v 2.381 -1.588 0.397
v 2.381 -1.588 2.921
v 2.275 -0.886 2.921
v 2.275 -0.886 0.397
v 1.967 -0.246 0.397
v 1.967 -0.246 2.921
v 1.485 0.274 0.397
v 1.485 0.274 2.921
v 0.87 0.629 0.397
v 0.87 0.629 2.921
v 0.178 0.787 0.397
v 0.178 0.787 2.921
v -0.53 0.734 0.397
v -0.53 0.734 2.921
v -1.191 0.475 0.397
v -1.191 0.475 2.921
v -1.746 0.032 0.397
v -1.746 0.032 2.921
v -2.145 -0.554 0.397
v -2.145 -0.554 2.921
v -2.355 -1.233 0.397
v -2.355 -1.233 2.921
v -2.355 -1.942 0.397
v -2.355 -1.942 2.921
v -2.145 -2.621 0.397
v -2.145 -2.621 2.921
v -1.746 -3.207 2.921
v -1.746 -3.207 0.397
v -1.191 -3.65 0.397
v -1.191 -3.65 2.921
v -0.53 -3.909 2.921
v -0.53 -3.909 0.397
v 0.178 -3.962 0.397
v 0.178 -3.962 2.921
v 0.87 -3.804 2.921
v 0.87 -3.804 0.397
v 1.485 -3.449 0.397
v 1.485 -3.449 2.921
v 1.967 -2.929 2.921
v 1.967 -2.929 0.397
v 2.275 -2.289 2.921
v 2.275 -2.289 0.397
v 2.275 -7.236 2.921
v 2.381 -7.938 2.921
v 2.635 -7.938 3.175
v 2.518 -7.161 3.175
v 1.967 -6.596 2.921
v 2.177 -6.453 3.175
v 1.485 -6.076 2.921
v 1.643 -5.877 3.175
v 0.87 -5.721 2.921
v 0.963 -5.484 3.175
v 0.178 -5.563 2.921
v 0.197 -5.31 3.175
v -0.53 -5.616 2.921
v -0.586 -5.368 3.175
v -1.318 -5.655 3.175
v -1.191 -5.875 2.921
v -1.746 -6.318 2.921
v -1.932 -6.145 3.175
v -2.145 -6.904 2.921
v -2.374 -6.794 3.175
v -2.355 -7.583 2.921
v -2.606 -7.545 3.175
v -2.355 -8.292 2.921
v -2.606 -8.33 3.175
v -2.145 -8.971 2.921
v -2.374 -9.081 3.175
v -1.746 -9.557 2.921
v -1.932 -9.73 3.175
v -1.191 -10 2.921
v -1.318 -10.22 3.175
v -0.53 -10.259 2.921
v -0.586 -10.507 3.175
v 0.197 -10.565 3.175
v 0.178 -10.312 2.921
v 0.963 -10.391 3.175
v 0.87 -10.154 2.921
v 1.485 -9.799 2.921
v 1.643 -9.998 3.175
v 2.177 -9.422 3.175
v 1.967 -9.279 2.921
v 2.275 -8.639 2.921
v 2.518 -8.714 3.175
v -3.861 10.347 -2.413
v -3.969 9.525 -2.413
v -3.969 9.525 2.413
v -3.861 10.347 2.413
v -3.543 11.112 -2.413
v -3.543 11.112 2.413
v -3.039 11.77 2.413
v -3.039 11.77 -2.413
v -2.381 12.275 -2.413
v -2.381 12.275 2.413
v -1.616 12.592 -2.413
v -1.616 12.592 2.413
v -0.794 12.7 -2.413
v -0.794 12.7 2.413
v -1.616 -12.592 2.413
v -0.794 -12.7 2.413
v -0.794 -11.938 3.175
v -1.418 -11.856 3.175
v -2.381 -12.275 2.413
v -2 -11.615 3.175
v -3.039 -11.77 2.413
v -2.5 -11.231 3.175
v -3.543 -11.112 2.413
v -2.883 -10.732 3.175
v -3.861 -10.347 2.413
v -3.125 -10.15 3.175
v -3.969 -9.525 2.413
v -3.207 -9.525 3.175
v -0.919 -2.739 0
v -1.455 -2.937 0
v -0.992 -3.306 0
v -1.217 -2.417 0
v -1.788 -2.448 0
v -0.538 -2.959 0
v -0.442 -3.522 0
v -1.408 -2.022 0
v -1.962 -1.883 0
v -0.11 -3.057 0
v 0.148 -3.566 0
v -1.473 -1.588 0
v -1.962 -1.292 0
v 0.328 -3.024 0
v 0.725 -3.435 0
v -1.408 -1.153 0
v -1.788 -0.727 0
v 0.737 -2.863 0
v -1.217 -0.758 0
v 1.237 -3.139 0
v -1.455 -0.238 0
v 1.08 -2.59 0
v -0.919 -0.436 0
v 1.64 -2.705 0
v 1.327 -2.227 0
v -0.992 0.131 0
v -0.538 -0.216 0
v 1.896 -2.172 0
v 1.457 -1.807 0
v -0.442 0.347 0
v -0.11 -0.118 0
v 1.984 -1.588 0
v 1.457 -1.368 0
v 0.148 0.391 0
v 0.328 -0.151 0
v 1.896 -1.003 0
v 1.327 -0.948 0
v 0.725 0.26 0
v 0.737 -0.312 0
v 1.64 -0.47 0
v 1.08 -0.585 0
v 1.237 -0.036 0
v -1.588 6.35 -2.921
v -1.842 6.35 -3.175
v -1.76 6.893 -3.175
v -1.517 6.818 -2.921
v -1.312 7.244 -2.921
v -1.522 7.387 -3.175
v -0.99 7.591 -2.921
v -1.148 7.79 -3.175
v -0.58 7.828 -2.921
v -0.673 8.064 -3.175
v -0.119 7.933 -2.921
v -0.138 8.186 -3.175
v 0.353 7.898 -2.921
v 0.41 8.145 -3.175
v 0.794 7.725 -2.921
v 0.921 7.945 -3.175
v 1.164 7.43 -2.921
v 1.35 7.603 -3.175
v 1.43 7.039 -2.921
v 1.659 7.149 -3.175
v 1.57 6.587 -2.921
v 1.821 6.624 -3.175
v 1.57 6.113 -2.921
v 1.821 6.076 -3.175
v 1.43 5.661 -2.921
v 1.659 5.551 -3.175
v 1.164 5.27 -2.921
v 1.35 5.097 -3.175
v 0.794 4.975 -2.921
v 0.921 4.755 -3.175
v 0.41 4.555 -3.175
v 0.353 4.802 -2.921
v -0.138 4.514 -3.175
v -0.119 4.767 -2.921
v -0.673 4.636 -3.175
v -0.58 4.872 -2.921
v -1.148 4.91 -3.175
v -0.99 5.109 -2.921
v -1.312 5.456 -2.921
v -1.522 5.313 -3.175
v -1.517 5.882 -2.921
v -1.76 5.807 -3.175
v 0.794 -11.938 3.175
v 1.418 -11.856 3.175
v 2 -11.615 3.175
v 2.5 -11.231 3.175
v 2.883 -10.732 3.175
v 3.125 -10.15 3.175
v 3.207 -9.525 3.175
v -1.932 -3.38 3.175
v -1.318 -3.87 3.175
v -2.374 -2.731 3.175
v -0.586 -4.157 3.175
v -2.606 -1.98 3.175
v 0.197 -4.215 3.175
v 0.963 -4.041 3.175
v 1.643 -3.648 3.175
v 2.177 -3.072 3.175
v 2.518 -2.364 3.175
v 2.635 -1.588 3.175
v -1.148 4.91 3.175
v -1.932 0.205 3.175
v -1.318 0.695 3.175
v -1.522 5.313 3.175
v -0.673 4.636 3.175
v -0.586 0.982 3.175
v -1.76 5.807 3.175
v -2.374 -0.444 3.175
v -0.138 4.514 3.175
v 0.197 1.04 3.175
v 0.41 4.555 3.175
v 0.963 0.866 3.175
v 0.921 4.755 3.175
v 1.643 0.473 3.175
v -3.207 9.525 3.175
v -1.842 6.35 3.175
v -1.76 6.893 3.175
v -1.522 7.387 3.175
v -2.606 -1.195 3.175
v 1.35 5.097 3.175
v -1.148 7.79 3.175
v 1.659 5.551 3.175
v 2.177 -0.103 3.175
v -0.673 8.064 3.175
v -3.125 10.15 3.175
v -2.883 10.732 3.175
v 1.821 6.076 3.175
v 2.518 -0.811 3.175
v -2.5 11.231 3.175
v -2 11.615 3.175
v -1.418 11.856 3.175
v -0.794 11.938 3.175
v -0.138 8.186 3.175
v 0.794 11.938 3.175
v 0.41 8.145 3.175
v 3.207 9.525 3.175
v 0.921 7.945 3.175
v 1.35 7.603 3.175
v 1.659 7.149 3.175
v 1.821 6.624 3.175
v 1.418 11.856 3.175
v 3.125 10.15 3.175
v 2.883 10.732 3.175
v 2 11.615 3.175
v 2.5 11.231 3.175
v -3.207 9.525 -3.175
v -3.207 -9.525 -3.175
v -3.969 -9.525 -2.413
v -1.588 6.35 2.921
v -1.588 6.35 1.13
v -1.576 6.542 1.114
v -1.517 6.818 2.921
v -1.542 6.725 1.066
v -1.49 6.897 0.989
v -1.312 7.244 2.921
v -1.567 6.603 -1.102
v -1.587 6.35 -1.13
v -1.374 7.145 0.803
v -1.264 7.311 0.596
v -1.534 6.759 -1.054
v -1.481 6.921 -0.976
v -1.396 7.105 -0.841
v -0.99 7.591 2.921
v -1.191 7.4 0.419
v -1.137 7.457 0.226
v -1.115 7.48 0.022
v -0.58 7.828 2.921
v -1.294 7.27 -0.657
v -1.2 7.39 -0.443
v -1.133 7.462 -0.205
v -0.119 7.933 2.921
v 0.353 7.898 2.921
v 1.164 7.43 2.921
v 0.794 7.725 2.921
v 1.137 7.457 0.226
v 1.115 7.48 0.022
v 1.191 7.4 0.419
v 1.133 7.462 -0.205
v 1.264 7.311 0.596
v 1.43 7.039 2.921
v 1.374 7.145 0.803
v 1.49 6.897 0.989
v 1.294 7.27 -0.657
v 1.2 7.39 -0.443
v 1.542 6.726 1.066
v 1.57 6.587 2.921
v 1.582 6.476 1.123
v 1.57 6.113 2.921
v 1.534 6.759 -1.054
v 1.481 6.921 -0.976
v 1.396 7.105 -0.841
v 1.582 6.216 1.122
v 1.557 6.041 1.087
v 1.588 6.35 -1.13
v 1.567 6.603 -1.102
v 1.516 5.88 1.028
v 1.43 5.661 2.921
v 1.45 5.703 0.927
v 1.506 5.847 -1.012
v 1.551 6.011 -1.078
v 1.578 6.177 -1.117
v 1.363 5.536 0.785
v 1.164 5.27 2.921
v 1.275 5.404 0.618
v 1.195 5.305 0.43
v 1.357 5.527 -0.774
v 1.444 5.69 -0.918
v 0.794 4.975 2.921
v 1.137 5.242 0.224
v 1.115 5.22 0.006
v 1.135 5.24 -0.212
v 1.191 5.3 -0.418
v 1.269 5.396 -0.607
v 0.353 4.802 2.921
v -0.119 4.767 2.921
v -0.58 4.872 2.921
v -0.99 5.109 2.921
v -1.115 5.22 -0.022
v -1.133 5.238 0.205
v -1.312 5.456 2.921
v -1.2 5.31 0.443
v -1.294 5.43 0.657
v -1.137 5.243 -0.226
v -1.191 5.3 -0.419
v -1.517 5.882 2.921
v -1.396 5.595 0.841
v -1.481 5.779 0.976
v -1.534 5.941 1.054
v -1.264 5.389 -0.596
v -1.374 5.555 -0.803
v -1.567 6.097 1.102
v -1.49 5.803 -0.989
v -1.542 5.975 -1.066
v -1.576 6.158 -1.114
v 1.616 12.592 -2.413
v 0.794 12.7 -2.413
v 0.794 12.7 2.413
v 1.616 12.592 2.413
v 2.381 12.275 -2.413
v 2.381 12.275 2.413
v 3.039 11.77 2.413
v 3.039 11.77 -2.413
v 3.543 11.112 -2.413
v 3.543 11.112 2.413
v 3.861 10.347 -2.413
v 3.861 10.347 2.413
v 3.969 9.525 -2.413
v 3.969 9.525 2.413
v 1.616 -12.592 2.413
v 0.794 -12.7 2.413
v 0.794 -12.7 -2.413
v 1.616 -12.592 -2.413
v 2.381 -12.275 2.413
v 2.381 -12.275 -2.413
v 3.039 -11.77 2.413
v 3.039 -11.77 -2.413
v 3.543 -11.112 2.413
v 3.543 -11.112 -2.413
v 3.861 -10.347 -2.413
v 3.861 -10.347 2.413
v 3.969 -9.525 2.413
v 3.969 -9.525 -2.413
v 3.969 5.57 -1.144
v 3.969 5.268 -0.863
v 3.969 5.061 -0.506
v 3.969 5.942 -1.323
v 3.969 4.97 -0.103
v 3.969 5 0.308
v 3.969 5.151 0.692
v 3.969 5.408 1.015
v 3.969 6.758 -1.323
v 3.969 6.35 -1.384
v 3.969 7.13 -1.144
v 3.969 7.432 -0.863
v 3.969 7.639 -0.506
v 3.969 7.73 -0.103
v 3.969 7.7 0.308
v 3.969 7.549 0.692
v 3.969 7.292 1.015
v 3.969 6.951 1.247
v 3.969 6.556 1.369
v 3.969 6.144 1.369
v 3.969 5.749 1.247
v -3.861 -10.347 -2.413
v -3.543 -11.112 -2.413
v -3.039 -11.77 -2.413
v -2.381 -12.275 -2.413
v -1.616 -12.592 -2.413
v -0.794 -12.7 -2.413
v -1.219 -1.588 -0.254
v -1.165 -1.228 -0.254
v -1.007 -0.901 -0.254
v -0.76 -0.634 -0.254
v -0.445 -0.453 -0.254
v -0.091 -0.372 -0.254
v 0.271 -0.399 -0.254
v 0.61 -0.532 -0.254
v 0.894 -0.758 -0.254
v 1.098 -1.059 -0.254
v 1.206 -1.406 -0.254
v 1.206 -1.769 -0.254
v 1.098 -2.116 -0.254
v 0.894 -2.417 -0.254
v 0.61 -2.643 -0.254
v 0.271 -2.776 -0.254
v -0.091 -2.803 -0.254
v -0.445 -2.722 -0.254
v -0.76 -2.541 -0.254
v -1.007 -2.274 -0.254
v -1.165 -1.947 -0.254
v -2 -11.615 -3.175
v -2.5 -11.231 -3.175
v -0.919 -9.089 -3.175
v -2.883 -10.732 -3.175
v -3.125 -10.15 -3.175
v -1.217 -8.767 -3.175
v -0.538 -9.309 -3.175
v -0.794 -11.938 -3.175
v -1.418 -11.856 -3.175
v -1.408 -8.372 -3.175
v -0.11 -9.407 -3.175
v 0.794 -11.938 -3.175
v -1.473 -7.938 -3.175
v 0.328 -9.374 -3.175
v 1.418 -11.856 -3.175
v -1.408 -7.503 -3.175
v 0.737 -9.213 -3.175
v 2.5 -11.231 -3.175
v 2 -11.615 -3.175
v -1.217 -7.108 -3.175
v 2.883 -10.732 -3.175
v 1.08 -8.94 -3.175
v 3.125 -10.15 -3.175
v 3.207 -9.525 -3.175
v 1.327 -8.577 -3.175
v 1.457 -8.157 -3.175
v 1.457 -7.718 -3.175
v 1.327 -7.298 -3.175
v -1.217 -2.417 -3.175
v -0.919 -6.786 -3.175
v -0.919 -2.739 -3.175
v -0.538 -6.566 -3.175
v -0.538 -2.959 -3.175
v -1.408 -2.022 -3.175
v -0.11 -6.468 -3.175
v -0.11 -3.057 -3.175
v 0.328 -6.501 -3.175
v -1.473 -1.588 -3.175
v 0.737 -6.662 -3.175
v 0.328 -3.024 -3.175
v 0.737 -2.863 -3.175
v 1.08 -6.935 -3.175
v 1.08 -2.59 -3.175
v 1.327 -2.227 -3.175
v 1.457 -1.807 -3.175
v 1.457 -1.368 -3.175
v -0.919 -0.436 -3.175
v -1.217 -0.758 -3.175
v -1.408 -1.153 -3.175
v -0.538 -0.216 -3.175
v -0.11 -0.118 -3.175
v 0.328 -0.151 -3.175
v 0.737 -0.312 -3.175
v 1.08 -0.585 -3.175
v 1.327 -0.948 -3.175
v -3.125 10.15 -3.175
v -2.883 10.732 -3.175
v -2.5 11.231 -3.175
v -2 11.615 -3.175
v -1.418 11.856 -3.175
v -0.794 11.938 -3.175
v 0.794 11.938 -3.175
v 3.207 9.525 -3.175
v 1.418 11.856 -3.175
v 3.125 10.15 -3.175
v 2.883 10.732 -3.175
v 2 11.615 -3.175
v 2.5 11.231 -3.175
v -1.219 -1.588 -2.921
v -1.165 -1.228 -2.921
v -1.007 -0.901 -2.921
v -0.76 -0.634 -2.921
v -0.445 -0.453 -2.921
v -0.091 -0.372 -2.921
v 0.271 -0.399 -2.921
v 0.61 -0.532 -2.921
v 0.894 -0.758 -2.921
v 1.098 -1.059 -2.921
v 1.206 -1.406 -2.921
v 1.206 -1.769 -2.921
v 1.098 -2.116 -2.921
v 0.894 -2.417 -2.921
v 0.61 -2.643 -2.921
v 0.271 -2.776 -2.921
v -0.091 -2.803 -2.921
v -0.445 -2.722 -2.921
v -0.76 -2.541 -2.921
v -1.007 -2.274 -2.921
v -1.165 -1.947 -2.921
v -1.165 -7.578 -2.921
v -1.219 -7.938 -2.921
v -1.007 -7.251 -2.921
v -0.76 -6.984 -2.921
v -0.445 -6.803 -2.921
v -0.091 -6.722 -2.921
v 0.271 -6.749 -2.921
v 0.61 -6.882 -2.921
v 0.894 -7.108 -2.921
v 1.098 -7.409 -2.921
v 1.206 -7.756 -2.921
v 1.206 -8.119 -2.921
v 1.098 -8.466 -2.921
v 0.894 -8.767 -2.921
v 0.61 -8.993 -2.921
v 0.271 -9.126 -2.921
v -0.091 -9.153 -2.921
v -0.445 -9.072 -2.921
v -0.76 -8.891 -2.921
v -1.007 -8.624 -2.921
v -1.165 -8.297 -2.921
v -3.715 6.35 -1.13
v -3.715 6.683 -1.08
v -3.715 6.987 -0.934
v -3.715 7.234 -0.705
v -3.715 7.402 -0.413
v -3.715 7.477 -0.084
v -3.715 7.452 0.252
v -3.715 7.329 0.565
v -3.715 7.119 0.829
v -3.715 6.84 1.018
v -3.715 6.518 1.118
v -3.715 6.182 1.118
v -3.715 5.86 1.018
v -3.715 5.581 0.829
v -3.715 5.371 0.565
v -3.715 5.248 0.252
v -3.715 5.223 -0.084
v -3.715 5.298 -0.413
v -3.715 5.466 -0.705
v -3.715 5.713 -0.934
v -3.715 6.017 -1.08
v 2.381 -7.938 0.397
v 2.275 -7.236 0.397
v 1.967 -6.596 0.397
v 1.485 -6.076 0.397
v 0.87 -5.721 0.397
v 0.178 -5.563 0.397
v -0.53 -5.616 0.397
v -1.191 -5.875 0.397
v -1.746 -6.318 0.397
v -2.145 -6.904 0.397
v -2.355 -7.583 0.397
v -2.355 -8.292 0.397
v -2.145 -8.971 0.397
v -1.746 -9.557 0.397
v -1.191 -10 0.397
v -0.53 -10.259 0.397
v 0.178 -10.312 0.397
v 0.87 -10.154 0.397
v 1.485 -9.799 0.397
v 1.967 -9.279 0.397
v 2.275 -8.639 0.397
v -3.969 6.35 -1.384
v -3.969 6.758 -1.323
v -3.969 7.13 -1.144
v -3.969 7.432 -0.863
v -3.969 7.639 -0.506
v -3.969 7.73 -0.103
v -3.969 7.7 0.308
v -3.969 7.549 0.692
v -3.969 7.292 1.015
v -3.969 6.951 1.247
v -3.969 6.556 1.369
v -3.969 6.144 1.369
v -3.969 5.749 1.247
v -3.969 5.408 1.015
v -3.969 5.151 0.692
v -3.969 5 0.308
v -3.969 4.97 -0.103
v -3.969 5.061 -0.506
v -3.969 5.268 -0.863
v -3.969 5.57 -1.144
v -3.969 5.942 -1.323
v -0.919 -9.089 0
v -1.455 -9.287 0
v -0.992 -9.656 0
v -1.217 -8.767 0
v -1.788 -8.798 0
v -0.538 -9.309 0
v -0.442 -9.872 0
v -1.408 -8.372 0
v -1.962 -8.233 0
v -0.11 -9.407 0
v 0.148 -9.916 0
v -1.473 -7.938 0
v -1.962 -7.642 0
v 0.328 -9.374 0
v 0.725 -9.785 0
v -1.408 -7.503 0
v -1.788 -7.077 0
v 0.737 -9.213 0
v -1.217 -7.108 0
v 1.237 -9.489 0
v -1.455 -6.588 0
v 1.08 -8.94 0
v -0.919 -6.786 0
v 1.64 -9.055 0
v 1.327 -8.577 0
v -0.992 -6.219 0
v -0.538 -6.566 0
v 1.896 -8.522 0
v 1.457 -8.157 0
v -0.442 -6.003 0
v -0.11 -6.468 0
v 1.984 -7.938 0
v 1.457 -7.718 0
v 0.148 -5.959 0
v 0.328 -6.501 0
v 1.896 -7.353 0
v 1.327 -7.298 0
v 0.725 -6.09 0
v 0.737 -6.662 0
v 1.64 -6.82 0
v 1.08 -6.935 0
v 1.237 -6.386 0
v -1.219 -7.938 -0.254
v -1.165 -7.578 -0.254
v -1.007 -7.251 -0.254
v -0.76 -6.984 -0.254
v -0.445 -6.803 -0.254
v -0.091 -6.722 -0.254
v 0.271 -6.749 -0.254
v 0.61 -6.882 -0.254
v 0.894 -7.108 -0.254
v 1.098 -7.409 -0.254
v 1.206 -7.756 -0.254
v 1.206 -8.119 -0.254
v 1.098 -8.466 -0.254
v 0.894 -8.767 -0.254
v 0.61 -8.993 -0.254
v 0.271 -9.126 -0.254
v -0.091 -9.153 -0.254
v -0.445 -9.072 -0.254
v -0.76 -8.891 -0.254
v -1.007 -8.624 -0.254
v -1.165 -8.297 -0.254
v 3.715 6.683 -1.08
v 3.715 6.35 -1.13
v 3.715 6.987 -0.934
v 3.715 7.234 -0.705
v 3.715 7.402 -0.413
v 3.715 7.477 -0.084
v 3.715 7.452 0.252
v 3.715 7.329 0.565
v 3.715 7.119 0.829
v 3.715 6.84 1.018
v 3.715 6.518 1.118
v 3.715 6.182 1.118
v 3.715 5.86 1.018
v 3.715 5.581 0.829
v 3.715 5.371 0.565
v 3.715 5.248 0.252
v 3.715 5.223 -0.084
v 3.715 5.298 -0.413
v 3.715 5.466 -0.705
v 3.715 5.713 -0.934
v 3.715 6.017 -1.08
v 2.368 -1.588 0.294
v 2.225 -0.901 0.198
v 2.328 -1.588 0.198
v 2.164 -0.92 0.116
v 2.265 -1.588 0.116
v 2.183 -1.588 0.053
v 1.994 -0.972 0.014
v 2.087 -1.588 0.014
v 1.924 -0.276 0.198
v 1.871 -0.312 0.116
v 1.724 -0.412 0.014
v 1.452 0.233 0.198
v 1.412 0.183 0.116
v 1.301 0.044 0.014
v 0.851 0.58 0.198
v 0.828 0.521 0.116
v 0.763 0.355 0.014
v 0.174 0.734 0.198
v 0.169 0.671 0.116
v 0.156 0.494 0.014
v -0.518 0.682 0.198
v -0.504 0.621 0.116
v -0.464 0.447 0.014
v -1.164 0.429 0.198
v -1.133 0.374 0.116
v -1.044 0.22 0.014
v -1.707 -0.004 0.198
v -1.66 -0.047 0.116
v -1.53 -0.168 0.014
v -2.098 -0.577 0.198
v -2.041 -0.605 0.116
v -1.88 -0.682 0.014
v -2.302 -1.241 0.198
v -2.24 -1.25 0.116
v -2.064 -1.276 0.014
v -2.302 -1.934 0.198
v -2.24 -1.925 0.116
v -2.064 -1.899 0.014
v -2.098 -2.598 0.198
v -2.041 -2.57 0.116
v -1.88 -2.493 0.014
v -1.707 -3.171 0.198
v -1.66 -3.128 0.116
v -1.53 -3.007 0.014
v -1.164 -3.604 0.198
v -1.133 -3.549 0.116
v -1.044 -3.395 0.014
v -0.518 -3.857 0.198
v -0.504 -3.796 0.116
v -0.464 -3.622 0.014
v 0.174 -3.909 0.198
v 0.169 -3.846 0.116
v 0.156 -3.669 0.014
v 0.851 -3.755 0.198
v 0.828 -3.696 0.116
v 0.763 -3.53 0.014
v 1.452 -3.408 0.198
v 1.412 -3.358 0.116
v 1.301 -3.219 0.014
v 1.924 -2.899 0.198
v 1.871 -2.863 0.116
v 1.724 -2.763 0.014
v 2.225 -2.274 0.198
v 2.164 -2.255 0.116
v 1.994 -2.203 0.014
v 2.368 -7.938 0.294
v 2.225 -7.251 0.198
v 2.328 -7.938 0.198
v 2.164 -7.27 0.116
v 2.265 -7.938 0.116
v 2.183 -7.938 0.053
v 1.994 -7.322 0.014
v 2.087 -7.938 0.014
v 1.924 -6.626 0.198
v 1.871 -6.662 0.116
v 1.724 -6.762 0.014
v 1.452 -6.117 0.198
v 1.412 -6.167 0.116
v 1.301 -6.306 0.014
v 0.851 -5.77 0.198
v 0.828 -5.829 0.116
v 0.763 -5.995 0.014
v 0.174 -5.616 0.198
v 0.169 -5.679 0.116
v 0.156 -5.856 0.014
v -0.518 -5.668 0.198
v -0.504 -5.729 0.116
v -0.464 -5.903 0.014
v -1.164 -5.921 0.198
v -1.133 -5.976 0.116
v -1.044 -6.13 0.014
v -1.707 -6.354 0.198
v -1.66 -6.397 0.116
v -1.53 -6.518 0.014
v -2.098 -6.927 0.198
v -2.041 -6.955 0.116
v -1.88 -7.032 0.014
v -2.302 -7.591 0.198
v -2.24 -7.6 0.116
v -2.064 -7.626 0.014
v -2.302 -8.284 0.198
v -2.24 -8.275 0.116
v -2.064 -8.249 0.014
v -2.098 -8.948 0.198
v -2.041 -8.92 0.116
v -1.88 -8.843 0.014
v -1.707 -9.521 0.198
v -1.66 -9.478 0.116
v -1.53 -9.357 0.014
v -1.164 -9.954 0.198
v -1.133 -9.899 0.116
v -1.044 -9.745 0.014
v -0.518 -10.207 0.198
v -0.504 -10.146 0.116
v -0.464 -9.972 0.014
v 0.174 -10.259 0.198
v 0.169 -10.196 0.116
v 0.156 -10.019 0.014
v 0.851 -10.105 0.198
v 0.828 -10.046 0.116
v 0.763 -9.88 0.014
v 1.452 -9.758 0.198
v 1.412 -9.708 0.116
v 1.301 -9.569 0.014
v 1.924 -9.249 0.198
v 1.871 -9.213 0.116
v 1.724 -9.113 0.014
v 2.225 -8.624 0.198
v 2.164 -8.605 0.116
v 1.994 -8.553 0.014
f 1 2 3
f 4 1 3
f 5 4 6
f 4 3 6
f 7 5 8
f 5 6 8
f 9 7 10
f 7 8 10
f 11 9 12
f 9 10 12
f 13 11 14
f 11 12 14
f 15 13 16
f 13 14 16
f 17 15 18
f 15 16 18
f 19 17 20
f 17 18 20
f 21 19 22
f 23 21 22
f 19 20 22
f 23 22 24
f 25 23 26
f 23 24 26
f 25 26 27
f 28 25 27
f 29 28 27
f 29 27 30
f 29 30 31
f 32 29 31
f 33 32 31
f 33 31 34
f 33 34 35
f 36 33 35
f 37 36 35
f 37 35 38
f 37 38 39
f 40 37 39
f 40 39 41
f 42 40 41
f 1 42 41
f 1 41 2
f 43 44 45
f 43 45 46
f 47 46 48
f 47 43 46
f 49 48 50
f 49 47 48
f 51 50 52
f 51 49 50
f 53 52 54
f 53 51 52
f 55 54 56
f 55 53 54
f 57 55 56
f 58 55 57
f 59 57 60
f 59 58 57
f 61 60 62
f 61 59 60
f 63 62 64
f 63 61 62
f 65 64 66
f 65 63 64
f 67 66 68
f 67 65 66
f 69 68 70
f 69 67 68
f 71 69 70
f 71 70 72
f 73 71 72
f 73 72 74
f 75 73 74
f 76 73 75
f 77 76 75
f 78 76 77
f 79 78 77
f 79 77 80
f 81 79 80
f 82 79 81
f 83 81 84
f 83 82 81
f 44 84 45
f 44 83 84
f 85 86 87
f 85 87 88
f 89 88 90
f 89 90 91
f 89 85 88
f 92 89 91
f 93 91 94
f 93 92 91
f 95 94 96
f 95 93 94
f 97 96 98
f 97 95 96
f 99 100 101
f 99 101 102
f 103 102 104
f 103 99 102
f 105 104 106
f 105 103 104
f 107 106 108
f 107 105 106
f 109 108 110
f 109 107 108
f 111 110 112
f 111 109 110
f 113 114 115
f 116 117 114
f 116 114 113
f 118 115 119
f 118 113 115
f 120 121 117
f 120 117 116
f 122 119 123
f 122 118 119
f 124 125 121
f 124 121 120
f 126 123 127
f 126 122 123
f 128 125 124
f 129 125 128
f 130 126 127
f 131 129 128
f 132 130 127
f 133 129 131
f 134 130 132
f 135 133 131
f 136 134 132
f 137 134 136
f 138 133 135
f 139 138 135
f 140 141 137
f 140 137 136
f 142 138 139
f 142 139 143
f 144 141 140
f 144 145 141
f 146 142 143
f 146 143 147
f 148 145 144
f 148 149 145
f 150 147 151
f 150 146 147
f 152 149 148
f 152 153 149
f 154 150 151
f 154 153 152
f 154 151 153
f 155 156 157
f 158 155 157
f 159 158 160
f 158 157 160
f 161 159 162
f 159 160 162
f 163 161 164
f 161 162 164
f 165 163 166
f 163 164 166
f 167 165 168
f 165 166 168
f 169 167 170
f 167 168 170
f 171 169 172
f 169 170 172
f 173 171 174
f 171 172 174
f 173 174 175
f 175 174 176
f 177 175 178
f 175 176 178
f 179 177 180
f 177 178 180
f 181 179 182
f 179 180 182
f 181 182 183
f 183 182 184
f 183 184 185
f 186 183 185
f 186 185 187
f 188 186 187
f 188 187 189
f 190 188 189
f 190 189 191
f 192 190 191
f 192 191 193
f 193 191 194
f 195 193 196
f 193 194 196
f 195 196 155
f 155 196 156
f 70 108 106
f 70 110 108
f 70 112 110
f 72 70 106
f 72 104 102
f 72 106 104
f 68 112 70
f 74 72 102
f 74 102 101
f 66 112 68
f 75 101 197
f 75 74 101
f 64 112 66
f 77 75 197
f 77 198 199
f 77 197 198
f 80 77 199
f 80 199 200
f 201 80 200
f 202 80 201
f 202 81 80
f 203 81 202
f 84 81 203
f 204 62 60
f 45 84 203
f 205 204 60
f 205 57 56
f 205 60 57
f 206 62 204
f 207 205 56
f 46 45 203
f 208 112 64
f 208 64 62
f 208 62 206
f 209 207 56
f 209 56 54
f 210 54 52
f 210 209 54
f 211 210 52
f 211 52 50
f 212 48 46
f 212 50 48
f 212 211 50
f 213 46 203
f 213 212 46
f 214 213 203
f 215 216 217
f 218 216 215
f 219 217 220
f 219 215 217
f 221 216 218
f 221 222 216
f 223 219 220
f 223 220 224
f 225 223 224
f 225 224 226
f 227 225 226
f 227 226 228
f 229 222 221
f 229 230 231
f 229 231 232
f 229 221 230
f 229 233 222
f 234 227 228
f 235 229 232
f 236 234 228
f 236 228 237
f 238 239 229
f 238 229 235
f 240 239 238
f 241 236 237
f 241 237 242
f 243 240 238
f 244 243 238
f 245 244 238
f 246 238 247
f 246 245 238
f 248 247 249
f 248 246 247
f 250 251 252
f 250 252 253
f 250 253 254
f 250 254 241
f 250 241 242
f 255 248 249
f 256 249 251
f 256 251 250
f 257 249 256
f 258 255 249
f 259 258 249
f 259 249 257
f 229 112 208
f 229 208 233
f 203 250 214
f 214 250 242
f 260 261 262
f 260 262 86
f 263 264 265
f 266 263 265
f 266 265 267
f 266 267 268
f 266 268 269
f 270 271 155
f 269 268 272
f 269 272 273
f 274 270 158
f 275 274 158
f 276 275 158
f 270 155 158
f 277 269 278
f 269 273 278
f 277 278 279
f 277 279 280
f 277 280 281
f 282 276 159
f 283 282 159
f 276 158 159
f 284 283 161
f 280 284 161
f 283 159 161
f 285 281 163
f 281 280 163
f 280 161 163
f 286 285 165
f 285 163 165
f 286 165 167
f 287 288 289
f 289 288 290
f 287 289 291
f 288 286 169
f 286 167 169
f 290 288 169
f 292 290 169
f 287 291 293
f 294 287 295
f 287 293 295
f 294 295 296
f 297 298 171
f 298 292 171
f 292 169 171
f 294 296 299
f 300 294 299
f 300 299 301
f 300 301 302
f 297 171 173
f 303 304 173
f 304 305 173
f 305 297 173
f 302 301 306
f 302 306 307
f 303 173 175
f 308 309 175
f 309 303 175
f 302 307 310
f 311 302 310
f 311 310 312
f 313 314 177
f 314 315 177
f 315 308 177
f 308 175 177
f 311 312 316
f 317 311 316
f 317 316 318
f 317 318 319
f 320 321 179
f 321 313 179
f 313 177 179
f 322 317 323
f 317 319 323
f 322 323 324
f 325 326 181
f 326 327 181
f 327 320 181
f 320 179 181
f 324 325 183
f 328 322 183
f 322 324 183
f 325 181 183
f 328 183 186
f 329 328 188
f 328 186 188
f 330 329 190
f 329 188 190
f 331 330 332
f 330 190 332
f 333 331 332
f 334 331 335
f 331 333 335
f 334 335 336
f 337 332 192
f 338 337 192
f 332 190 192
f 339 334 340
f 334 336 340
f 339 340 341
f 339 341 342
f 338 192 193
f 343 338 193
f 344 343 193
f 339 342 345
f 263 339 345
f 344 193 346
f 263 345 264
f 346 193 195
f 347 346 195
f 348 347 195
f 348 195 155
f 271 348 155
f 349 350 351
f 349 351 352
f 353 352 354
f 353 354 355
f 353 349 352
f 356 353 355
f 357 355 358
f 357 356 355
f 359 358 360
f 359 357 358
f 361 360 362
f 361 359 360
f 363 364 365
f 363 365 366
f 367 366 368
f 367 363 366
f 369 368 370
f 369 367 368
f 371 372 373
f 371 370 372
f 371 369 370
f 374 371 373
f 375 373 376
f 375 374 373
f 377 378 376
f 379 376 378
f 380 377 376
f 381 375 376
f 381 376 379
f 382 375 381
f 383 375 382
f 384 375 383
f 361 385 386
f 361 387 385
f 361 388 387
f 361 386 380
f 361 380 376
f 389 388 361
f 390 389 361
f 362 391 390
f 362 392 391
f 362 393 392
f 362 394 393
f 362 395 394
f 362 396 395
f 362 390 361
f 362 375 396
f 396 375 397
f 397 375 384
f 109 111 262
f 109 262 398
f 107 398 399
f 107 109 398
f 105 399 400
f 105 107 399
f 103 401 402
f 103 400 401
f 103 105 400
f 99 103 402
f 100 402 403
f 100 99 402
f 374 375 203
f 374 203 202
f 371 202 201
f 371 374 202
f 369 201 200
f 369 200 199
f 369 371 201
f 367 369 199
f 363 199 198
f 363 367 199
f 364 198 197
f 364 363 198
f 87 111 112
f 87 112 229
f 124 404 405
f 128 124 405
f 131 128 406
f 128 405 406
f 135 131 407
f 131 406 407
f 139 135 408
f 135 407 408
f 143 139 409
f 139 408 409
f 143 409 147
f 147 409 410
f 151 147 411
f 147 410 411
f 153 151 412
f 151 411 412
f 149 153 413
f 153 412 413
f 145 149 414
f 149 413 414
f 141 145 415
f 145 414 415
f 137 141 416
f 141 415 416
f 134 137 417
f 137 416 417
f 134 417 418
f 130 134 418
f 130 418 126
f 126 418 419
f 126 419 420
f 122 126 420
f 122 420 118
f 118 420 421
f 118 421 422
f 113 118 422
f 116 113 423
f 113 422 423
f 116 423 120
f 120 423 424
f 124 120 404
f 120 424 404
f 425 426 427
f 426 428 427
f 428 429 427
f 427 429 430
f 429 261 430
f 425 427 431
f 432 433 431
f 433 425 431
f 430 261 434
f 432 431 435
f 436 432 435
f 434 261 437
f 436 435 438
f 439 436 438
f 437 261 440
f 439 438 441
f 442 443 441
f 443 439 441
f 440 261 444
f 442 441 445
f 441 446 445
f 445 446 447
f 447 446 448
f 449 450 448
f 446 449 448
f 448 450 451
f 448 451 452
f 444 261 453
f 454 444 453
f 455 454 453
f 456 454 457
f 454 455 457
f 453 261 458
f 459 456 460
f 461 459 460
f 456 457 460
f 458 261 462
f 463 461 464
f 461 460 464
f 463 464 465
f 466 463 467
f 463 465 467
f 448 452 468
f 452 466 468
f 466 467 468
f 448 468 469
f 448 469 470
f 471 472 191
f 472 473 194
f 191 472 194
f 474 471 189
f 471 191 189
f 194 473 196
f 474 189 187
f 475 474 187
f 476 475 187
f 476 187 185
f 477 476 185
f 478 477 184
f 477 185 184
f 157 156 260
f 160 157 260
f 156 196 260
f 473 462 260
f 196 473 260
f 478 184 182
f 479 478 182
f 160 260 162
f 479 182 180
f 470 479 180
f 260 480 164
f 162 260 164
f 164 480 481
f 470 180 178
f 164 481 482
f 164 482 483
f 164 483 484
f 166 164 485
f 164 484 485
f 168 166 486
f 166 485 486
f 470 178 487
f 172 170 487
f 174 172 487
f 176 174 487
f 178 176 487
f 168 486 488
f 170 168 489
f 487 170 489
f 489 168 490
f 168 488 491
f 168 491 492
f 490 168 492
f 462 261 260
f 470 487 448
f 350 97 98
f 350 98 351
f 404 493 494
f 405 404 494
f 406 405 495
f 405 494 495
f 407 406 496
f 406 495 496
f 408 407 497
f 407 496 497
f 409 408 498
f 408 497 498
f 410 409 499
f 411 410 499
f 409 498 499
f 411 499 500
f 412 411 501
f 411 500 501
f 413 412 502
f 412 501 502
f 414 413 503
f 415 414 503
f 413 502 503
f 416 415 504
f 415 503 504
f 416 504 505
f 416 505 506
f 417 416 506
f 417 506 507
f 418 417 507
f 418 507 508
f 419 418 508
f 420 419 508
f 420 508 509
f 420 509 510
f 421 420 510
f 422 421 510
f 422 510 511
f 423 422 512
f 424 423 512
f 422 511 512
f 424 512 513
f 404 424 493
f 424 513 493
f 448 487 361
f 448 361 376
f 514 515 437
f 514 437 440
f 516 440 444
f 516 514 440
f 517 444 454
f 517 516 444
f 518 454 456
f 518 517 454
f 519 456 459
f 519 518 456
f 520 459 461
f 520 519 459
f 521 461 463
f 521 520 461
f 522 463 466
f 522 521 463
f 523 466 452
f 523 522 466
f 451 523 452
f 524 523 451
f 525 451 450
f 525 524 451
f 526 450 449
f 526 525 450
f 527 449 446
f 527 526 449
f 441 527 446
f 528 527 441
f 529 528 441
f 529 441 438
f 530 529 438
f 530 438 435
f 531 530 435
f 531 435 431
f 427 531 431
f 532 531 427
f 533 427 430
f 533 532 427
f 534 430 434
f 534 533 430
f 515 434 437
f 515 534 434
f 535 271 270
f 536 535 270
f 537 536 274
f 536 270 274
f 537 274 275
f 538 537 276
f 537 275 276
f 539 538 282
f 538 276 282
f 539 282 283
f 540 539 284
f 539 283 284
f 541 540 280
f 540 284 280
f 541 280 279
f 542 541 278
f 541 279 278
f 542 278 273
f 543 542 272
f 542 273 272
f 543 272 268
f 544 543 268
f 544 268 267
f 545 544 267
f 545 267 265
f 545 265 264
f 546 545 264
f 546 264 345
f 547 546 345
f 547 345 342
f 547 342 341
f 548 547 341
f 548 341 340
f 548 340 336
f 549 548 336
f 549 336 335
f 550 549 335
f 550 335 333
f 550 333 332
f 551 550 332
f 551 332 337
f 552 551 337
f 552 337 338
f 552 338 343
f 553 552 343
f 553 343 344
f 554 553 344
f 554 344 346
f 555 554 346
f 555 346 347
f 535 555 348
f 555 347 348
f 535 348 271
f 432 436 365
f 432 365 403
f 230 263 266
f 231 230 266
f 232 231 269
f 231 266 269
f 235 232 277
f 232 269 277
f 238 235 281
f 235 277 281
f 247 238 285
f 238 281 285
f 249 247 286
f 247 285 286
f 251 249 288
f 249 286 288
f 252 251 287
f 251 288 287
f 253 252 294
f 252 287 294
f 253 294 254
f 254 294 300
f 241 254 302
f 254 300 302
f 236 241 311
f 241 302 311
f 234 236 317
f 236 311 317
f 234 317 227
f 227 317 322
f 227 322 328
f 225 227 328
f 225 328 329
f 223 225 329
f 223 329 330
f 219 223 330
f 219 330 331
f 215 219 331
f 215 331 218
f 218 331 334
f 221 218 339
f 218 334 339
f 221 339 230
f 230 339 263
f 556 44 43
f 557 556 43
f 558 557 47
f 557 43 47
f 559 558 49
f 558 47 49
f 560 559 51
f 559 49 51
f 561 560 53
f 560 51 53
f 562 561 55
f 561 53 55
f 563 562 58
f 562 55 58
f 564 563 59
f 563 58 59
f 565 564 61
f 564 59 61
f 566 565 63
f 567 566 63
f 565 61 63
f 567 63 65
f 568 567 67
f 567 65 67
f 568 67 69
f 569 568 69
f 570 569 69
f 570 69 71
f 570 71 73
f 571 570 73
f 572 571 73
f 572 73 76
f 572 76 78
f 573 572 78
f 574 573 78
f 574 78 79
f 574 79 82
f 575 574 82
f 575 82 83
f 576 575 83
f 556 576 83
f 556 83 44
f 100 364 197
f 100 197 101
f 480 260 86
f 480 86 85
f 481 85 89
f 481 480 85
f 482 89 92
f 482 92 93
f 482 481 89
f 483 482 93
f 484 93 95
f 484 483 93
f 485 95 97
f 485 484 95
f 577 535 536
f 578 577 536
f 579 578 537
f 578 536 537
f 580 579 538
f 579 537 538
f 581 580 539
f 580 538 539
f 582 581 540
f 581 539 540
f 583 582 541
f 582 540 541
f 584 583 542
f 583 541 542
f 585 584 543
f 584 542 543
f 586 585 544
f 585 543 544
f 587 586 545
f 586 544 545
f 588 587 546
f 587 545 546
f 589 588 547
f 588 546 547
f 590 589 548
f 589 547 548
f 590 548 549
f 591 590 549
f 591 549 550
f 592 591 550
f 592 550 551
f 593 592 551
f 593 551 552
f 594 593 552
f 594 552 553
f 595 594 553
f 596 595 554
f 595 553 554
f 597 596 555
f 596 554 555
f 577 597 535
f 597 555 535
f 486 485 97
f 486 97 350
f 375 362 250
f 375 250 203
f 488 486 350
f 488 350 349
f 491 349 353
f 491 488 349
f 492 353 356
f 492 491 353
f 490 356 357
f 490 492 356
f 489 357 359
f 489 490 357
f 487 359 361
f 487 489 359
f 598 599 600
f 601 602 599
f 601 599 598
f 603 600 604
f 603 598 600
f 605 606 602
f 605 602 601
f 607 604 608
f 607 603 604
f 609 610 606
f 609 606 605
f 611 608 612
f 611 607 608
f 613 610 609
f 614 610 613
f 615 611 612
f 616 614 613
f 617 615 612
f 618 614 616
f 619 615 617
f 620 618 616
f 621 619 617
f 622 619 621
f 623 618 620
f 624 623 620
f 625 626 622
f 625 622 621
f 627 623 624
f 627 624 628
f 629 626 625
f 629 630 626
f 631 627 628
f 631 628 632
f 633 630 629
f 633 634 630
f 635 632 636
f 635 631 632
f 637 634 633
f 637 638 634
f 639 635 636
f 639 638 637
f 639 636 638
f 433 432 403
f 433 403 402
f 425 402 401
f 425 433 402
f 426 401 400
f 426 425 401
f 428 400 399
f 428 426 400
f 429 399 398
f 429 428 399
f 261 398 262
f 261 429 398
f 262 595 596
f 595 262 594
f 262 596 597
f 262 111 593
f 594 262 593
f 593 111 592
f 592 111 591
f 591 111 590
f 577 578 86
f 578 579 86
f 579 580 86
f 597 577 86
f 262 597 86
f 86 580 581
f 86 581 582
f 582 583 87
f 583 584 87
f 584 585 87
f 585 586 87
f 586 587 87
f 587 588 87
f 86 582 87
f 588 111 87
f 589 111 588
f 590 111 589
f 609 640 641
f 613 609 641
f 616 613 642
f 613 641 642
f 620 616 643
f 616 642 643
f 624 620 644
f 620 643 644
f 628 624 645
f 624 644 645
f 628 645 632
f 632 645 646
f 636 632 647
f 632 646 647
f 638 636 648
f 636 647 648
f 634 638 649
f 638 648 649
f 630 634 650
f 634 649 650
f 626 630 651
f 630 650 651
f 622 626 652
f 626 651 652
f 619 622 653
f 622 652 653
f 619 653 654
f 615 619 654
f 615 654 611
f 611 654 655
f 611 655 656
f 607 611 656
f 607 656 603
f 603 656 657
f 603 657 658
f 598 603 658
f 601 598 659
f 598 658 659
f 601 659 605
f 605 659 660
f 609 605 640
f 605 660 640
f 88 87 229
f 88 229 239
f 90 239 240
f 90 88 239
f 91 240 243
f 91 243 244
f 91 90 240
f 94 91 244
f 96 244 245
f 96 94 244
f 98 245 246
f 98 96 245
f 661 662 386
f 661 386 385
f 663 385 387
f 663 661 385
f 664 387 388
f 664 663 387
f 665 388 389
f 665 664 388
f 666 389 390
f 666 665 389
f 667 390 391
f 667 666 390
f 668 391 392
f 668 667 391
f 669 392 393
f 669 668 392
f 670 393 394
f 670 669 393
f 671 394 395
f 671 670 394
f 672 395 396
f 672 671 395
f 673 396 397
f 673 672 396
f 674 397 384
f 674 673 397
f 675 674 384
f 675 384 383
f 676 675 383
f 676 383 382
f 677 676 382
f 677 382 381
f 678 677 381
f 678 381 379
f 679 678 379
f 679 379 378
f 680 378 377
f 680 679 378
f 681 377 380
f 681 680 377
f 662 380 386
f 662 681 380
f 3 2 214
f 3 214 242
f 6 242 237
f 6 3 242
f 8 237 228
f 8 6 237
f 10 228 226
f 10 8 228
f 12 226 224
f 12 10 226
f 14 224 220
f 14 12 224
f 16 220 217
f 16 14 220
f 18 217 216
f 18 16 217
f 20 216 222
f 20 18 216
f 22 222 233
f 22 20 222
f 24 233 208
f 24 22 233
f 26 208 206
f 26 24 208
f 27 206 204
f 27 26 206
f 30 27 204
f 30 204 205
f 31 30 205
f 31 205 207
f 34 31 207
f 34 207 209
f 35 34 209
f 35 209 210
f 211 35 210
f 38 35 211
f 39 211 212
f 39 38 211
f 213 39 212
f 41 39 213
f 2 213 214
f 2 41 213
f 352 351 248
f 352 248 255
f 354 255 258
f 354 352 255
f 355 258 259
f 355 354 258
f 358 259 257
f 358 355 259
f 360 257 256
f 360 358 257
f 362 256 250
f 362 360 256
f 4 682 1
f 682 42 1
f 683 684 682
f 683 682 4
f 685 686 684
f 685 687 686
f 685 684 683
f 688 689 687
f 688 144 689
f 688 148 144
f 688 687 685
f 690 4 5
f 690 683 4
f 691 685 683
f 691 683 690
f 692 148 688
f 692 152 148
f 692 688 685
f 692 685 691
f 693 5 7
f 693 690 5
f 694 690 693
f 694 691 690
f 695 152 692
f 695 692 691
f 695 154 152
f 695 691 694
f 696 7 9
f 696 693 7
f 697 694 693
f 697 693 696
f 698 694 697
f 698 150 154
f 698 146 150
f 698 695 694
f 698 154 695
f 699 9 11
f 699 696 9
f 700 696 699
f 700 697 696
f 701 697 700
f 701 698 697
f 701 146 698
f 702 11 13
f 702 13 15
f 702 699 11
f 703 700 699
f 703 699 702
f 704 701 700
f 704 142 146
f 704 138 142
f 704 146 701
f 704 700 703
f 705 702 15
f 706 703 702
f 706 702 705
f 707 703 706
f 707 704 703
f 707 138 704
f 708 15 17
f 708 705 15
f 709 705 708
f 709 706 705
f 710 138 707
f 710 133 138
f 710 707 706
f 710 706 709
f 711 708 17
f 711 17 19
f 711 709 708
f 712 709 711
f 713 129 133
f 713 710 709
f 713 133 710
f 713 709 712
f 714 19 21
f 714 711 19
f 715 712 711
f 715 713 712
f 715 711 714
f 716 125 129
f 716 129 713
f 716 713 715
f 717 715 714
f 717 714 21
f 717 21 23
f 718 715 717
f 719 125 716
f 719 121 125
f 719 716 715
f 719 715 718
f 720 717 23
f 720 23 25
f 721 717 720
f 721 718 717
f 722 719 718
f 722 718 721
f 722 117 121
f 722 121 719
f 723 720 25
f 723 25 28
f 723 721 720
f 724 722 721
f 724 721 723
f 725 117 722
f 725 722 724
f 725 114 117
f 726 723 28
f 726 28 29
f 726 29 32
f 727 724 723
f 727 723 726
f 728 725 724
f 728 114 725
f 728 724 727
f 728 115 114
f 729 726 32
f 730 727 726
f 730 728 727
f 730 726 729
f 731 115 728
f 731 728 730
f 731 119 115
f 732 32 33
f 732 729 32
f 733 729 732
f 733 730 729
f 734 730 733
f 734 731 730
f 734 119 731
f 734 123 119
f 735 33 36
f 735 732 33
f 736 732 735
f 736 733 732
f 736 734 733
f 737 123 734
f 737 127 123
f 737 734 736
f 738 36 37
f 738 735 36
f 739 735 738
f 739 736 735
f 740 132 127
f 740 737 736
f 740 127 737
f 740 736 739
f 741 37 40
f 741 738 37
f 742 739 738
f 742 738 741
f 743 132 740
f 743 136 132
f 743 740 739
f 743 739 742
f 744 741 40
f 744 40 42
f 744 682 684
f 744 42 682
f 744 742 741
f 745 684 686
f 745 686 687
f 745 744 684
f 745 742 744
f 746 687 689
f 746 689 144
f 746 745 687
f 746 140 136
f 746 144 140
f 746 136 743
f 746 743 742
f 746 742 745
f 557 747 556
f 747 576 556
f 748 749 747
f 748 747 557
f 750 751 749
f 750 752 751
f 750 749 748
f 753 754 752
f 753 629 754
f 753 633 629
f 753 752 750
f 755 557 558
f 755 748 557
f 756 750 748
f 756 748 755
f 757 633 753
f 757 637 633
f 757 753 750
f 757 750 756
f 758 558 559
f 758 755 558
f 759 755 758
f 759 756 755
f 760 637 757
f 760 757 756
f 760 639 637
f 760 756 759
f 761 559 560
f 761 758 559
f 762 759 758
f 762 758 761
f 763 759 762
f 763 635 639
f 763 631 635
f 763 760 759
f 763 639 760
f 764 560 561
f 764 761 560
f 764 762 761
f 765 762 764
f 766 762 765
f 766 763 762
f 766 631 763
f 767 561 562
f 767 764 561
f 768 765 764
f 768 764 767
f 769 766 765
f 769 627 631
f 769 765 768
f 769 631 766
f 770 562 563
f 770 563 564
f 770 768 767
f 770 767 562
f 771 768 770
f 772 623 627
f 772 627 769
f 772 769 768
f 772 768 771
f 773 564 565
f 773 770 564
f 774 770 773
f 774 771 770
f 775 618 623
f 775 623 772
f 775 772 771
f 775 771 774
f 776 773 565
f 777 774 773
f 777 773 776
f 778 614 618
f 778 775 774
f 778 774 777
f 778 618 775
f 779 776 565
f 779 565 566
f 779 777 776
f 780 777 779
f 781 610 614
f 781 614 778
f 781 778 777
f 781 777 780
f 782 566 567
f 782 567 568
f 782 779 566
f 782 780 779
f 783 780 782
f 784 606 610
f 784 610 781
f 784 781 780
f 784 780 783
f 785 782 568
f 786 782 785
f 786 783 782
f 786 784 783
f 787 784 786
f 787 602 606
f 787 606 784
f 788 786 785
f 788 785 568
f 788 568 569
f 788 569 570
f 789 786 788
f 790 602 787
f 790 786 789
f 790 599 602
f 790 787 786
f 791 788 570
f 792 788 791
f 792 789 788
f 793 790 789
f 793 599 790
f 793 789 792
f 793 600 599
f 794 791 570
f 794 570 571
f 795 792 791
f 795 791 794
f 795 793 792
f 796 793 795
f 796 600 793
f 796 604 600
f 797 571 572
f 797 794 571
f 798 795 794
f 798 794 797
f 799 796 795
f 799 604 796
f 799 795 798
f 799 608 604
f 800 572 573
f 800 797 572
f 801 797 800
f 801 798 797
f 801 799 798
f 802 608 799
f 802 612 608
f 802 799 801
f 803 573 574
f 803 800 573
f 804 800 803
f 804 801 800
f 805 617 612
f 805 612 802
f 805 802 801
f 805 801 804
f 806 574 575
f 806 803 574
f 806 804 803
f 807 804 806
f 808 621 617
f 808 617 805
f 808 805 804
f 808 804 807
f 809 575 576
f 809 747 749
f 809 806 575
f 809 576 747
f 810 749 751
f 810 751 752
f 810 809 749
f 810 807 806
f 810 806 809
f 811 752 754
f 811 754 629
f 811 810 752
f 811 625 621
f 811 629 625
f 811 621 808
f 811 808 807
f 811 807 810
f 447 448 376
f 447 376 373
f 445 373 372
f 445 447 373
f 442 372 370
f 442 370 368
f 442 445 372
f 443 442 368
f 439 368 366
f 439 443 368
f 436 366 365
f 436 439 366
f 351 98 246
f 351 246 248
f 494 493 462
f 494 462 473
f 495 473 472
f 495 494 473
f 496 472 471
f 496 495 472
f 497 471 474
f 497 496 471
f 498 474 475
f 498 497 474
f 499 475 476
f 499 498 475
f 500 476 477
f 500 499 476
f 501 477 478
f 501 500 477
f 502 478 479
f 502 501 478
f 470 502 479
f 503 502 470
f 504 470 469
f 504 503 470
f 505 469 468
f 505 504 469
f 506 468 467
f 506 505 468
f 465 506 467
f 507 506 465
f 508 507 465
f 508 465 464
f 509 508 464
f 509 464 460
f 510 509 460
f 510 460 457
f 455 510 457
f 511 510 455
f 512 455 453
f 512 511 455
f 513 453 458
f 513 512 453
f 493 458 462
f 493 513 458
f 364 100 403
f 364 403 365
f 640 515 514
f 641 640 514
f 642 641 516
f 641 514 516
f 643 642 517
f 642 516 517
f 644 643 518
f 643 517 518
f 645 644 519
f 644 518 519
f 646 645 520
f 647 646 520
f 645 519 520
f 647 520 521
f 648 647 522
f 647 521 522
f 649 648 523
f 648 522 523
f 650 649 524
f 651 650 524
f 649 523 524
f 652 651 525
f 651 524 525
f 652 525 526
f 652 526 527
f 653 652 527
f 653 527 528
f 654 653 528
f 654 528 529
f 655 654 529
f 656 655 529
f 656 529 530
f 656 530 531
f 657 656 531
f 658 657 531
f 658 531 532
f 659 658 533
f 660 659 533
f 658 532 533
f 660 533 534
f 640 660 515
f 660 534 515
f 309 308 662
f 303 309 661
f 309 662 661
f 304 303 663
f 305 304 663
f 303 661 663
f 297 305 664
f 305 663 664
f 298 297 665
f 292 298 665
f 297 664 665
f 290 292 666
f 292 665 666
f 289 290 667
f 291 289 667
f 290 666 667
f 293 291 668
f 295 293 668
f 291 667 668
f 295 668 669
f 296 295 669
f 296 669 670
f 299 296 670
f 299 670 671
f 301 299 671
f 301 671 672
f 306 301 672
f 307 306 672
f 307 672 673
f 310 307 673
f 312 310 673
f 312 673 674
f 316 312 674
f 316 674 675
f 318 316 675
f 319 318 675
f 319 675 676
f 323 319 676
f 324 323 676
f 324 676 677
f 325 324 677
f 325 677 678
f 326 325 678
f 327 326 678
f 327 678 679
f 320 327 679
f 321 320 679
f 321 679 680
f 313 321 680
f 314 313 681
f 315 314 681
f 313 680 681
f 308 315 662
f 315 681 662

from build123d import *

# Parameters (mm, degrees)
SKETCH1_W                                           = 7.9375
SKETCH1_H                                           = 25.4
BOSS_EXTRUDE1_DEPTH                                 = 3.175
F_1_8_0_125_DIAMETER_HOLE1_D                        = 3.175
CBORE_FOR_2_BINDING_HEAD_MACHINE_SCREW1_D           = 2.4384
CBORE_FOR_2_BINDING_HEAD_MACHINE_SCREW1_CBORE_D     = 4.7625
CBORE_FOR_2_BINDING_HEAD_MACHINE_SCREW1_CBORE_DEPTH = 3.175
F_4_40_TAPPED_HOLE1_D                               = 2.2606
FILLET1_R                                           = 3.175
FILLET2_R                                           = 0.396875
CHAMFER2_SIZE                                       = 0.762
CHAMFER3_SIZE                                       = 0.254


with BuildPart() as part:
    # Sketch1 → Boss-Extrude1 (new body, symmetric)
    with BuildSketch(Plane.XY):
        Rectangle(SKETCH1_W, SKETCH1_H)
    extrude(amount=BOSS_EXTRUDE1_DEPTH, both=True)

    # 1/8 (0.125) Diameter Hole1 (through all)
    with Locations(Plane.XY.offset(3.175)):
        with Locations((0, 6.35)):
            Hole(F_1_8_0_125_DIAMETER_HOLE1_D / 2)

    # CBORE for #2 Binding Head Machine Screw1 (through all)
    with Locations(Plane.XY.offset(3.175)):
        with Locations((0, -1.5875), (0, -7.9375)):
            CounterBoreHole(CBORE_FOR_2_BINDING_HEAD_MACHINE_SCREW1_D / 2, CBORE_FOR_2_BINDING_HEAD_MACHINE_SCREW1_CBORE_D / 2, CBORE_FOR_2_BINDING_HEAD_MACHINE_SCREW1_CBORE_DEPTH)

    # #4-40 Tapped Hole1 (through all)
    with Locations(Plane.ZY.offset(3.96875)):
        with Locations((0, 6.35)):
            Hole(F_4_40_TAPPED_HOLE1_D / 2)

    # Fillet1
    fillet1_edges = [part.edges().sort_by_distance(p)[0] for p in [
        (-3.96875, -12.7, 0),
        (3.96875, -12.7, 0),
        (3.96875, 12.7, 0),
        (-3.96875, 12.7, 0),
    ]]
    fillet(fillet1_edges, radius=FILLET1_R)

    # Fillet2
    fillet2_edges = [part.edges().sort_by_distance(p)[0] for p in [
        (-2.38125, -7.9375, 0),
        (-2.38125, -1.5875, 0),
    ]]
    fillet(fillet2_edges, radius=FILLET2_R)

    # Chamfer2
    chamfer2_edges = [part.edges().sort_by_distance(p)[0] for p in [
        (0, 12.7, -3.175),
        (0, 12.7, 3.175),
        (-3.96875, 0, -3.175),
        (3.96875, 0, -3.175),
        (0, -12.7, -3.175),
        (-3.03881403, 11.77006403, -3.175),
        (-3.03881403, -11.77006403, -3.175),
        (3.03881403, -11.77006403, -3.175),
        (3.03881403, 11.77006403, -3.175),
        (3.96875, 0, 3.175),
        (-3.96875, 0, 3.175),
        (0, -12.7, 3.175),
        (-3.03881403, 11.77006403, 3.175),
        (-3.03881403, -11.77006403, 3.175),
        (3.03881403, -11.77006403, 3.175),
        (3.03881403, 11.77006403, 3.175),
    ]]
    chamfer(chamfer2_edges, length=CHAMFER2_SIZE)

    # Chamfer3
    chamfer3_edges = [part.edges().sort_by_distance(p)[0] for p in [
        (1.5875, 6.35, 3.175),
        (1.5875, 6.35, -3.175),
        (-2.38125, -7.9375, 3.175),
        (1.2192, -7.9375, -3.175),
        (1.2192, -7.9375, 0),
        (-2.38125, -1.5875, 3.175),
        (1.2192, -1.5875, -3.175),
        (1.2192, -1.5875, 0),
        (3.96875, 6.35, 1.1303),
        (-3.96875, 6.35, 1.1303),
    ]]
    chamfer(chamfer3_edges, length=CHAMFER3_SIZE)


solid = part.part
